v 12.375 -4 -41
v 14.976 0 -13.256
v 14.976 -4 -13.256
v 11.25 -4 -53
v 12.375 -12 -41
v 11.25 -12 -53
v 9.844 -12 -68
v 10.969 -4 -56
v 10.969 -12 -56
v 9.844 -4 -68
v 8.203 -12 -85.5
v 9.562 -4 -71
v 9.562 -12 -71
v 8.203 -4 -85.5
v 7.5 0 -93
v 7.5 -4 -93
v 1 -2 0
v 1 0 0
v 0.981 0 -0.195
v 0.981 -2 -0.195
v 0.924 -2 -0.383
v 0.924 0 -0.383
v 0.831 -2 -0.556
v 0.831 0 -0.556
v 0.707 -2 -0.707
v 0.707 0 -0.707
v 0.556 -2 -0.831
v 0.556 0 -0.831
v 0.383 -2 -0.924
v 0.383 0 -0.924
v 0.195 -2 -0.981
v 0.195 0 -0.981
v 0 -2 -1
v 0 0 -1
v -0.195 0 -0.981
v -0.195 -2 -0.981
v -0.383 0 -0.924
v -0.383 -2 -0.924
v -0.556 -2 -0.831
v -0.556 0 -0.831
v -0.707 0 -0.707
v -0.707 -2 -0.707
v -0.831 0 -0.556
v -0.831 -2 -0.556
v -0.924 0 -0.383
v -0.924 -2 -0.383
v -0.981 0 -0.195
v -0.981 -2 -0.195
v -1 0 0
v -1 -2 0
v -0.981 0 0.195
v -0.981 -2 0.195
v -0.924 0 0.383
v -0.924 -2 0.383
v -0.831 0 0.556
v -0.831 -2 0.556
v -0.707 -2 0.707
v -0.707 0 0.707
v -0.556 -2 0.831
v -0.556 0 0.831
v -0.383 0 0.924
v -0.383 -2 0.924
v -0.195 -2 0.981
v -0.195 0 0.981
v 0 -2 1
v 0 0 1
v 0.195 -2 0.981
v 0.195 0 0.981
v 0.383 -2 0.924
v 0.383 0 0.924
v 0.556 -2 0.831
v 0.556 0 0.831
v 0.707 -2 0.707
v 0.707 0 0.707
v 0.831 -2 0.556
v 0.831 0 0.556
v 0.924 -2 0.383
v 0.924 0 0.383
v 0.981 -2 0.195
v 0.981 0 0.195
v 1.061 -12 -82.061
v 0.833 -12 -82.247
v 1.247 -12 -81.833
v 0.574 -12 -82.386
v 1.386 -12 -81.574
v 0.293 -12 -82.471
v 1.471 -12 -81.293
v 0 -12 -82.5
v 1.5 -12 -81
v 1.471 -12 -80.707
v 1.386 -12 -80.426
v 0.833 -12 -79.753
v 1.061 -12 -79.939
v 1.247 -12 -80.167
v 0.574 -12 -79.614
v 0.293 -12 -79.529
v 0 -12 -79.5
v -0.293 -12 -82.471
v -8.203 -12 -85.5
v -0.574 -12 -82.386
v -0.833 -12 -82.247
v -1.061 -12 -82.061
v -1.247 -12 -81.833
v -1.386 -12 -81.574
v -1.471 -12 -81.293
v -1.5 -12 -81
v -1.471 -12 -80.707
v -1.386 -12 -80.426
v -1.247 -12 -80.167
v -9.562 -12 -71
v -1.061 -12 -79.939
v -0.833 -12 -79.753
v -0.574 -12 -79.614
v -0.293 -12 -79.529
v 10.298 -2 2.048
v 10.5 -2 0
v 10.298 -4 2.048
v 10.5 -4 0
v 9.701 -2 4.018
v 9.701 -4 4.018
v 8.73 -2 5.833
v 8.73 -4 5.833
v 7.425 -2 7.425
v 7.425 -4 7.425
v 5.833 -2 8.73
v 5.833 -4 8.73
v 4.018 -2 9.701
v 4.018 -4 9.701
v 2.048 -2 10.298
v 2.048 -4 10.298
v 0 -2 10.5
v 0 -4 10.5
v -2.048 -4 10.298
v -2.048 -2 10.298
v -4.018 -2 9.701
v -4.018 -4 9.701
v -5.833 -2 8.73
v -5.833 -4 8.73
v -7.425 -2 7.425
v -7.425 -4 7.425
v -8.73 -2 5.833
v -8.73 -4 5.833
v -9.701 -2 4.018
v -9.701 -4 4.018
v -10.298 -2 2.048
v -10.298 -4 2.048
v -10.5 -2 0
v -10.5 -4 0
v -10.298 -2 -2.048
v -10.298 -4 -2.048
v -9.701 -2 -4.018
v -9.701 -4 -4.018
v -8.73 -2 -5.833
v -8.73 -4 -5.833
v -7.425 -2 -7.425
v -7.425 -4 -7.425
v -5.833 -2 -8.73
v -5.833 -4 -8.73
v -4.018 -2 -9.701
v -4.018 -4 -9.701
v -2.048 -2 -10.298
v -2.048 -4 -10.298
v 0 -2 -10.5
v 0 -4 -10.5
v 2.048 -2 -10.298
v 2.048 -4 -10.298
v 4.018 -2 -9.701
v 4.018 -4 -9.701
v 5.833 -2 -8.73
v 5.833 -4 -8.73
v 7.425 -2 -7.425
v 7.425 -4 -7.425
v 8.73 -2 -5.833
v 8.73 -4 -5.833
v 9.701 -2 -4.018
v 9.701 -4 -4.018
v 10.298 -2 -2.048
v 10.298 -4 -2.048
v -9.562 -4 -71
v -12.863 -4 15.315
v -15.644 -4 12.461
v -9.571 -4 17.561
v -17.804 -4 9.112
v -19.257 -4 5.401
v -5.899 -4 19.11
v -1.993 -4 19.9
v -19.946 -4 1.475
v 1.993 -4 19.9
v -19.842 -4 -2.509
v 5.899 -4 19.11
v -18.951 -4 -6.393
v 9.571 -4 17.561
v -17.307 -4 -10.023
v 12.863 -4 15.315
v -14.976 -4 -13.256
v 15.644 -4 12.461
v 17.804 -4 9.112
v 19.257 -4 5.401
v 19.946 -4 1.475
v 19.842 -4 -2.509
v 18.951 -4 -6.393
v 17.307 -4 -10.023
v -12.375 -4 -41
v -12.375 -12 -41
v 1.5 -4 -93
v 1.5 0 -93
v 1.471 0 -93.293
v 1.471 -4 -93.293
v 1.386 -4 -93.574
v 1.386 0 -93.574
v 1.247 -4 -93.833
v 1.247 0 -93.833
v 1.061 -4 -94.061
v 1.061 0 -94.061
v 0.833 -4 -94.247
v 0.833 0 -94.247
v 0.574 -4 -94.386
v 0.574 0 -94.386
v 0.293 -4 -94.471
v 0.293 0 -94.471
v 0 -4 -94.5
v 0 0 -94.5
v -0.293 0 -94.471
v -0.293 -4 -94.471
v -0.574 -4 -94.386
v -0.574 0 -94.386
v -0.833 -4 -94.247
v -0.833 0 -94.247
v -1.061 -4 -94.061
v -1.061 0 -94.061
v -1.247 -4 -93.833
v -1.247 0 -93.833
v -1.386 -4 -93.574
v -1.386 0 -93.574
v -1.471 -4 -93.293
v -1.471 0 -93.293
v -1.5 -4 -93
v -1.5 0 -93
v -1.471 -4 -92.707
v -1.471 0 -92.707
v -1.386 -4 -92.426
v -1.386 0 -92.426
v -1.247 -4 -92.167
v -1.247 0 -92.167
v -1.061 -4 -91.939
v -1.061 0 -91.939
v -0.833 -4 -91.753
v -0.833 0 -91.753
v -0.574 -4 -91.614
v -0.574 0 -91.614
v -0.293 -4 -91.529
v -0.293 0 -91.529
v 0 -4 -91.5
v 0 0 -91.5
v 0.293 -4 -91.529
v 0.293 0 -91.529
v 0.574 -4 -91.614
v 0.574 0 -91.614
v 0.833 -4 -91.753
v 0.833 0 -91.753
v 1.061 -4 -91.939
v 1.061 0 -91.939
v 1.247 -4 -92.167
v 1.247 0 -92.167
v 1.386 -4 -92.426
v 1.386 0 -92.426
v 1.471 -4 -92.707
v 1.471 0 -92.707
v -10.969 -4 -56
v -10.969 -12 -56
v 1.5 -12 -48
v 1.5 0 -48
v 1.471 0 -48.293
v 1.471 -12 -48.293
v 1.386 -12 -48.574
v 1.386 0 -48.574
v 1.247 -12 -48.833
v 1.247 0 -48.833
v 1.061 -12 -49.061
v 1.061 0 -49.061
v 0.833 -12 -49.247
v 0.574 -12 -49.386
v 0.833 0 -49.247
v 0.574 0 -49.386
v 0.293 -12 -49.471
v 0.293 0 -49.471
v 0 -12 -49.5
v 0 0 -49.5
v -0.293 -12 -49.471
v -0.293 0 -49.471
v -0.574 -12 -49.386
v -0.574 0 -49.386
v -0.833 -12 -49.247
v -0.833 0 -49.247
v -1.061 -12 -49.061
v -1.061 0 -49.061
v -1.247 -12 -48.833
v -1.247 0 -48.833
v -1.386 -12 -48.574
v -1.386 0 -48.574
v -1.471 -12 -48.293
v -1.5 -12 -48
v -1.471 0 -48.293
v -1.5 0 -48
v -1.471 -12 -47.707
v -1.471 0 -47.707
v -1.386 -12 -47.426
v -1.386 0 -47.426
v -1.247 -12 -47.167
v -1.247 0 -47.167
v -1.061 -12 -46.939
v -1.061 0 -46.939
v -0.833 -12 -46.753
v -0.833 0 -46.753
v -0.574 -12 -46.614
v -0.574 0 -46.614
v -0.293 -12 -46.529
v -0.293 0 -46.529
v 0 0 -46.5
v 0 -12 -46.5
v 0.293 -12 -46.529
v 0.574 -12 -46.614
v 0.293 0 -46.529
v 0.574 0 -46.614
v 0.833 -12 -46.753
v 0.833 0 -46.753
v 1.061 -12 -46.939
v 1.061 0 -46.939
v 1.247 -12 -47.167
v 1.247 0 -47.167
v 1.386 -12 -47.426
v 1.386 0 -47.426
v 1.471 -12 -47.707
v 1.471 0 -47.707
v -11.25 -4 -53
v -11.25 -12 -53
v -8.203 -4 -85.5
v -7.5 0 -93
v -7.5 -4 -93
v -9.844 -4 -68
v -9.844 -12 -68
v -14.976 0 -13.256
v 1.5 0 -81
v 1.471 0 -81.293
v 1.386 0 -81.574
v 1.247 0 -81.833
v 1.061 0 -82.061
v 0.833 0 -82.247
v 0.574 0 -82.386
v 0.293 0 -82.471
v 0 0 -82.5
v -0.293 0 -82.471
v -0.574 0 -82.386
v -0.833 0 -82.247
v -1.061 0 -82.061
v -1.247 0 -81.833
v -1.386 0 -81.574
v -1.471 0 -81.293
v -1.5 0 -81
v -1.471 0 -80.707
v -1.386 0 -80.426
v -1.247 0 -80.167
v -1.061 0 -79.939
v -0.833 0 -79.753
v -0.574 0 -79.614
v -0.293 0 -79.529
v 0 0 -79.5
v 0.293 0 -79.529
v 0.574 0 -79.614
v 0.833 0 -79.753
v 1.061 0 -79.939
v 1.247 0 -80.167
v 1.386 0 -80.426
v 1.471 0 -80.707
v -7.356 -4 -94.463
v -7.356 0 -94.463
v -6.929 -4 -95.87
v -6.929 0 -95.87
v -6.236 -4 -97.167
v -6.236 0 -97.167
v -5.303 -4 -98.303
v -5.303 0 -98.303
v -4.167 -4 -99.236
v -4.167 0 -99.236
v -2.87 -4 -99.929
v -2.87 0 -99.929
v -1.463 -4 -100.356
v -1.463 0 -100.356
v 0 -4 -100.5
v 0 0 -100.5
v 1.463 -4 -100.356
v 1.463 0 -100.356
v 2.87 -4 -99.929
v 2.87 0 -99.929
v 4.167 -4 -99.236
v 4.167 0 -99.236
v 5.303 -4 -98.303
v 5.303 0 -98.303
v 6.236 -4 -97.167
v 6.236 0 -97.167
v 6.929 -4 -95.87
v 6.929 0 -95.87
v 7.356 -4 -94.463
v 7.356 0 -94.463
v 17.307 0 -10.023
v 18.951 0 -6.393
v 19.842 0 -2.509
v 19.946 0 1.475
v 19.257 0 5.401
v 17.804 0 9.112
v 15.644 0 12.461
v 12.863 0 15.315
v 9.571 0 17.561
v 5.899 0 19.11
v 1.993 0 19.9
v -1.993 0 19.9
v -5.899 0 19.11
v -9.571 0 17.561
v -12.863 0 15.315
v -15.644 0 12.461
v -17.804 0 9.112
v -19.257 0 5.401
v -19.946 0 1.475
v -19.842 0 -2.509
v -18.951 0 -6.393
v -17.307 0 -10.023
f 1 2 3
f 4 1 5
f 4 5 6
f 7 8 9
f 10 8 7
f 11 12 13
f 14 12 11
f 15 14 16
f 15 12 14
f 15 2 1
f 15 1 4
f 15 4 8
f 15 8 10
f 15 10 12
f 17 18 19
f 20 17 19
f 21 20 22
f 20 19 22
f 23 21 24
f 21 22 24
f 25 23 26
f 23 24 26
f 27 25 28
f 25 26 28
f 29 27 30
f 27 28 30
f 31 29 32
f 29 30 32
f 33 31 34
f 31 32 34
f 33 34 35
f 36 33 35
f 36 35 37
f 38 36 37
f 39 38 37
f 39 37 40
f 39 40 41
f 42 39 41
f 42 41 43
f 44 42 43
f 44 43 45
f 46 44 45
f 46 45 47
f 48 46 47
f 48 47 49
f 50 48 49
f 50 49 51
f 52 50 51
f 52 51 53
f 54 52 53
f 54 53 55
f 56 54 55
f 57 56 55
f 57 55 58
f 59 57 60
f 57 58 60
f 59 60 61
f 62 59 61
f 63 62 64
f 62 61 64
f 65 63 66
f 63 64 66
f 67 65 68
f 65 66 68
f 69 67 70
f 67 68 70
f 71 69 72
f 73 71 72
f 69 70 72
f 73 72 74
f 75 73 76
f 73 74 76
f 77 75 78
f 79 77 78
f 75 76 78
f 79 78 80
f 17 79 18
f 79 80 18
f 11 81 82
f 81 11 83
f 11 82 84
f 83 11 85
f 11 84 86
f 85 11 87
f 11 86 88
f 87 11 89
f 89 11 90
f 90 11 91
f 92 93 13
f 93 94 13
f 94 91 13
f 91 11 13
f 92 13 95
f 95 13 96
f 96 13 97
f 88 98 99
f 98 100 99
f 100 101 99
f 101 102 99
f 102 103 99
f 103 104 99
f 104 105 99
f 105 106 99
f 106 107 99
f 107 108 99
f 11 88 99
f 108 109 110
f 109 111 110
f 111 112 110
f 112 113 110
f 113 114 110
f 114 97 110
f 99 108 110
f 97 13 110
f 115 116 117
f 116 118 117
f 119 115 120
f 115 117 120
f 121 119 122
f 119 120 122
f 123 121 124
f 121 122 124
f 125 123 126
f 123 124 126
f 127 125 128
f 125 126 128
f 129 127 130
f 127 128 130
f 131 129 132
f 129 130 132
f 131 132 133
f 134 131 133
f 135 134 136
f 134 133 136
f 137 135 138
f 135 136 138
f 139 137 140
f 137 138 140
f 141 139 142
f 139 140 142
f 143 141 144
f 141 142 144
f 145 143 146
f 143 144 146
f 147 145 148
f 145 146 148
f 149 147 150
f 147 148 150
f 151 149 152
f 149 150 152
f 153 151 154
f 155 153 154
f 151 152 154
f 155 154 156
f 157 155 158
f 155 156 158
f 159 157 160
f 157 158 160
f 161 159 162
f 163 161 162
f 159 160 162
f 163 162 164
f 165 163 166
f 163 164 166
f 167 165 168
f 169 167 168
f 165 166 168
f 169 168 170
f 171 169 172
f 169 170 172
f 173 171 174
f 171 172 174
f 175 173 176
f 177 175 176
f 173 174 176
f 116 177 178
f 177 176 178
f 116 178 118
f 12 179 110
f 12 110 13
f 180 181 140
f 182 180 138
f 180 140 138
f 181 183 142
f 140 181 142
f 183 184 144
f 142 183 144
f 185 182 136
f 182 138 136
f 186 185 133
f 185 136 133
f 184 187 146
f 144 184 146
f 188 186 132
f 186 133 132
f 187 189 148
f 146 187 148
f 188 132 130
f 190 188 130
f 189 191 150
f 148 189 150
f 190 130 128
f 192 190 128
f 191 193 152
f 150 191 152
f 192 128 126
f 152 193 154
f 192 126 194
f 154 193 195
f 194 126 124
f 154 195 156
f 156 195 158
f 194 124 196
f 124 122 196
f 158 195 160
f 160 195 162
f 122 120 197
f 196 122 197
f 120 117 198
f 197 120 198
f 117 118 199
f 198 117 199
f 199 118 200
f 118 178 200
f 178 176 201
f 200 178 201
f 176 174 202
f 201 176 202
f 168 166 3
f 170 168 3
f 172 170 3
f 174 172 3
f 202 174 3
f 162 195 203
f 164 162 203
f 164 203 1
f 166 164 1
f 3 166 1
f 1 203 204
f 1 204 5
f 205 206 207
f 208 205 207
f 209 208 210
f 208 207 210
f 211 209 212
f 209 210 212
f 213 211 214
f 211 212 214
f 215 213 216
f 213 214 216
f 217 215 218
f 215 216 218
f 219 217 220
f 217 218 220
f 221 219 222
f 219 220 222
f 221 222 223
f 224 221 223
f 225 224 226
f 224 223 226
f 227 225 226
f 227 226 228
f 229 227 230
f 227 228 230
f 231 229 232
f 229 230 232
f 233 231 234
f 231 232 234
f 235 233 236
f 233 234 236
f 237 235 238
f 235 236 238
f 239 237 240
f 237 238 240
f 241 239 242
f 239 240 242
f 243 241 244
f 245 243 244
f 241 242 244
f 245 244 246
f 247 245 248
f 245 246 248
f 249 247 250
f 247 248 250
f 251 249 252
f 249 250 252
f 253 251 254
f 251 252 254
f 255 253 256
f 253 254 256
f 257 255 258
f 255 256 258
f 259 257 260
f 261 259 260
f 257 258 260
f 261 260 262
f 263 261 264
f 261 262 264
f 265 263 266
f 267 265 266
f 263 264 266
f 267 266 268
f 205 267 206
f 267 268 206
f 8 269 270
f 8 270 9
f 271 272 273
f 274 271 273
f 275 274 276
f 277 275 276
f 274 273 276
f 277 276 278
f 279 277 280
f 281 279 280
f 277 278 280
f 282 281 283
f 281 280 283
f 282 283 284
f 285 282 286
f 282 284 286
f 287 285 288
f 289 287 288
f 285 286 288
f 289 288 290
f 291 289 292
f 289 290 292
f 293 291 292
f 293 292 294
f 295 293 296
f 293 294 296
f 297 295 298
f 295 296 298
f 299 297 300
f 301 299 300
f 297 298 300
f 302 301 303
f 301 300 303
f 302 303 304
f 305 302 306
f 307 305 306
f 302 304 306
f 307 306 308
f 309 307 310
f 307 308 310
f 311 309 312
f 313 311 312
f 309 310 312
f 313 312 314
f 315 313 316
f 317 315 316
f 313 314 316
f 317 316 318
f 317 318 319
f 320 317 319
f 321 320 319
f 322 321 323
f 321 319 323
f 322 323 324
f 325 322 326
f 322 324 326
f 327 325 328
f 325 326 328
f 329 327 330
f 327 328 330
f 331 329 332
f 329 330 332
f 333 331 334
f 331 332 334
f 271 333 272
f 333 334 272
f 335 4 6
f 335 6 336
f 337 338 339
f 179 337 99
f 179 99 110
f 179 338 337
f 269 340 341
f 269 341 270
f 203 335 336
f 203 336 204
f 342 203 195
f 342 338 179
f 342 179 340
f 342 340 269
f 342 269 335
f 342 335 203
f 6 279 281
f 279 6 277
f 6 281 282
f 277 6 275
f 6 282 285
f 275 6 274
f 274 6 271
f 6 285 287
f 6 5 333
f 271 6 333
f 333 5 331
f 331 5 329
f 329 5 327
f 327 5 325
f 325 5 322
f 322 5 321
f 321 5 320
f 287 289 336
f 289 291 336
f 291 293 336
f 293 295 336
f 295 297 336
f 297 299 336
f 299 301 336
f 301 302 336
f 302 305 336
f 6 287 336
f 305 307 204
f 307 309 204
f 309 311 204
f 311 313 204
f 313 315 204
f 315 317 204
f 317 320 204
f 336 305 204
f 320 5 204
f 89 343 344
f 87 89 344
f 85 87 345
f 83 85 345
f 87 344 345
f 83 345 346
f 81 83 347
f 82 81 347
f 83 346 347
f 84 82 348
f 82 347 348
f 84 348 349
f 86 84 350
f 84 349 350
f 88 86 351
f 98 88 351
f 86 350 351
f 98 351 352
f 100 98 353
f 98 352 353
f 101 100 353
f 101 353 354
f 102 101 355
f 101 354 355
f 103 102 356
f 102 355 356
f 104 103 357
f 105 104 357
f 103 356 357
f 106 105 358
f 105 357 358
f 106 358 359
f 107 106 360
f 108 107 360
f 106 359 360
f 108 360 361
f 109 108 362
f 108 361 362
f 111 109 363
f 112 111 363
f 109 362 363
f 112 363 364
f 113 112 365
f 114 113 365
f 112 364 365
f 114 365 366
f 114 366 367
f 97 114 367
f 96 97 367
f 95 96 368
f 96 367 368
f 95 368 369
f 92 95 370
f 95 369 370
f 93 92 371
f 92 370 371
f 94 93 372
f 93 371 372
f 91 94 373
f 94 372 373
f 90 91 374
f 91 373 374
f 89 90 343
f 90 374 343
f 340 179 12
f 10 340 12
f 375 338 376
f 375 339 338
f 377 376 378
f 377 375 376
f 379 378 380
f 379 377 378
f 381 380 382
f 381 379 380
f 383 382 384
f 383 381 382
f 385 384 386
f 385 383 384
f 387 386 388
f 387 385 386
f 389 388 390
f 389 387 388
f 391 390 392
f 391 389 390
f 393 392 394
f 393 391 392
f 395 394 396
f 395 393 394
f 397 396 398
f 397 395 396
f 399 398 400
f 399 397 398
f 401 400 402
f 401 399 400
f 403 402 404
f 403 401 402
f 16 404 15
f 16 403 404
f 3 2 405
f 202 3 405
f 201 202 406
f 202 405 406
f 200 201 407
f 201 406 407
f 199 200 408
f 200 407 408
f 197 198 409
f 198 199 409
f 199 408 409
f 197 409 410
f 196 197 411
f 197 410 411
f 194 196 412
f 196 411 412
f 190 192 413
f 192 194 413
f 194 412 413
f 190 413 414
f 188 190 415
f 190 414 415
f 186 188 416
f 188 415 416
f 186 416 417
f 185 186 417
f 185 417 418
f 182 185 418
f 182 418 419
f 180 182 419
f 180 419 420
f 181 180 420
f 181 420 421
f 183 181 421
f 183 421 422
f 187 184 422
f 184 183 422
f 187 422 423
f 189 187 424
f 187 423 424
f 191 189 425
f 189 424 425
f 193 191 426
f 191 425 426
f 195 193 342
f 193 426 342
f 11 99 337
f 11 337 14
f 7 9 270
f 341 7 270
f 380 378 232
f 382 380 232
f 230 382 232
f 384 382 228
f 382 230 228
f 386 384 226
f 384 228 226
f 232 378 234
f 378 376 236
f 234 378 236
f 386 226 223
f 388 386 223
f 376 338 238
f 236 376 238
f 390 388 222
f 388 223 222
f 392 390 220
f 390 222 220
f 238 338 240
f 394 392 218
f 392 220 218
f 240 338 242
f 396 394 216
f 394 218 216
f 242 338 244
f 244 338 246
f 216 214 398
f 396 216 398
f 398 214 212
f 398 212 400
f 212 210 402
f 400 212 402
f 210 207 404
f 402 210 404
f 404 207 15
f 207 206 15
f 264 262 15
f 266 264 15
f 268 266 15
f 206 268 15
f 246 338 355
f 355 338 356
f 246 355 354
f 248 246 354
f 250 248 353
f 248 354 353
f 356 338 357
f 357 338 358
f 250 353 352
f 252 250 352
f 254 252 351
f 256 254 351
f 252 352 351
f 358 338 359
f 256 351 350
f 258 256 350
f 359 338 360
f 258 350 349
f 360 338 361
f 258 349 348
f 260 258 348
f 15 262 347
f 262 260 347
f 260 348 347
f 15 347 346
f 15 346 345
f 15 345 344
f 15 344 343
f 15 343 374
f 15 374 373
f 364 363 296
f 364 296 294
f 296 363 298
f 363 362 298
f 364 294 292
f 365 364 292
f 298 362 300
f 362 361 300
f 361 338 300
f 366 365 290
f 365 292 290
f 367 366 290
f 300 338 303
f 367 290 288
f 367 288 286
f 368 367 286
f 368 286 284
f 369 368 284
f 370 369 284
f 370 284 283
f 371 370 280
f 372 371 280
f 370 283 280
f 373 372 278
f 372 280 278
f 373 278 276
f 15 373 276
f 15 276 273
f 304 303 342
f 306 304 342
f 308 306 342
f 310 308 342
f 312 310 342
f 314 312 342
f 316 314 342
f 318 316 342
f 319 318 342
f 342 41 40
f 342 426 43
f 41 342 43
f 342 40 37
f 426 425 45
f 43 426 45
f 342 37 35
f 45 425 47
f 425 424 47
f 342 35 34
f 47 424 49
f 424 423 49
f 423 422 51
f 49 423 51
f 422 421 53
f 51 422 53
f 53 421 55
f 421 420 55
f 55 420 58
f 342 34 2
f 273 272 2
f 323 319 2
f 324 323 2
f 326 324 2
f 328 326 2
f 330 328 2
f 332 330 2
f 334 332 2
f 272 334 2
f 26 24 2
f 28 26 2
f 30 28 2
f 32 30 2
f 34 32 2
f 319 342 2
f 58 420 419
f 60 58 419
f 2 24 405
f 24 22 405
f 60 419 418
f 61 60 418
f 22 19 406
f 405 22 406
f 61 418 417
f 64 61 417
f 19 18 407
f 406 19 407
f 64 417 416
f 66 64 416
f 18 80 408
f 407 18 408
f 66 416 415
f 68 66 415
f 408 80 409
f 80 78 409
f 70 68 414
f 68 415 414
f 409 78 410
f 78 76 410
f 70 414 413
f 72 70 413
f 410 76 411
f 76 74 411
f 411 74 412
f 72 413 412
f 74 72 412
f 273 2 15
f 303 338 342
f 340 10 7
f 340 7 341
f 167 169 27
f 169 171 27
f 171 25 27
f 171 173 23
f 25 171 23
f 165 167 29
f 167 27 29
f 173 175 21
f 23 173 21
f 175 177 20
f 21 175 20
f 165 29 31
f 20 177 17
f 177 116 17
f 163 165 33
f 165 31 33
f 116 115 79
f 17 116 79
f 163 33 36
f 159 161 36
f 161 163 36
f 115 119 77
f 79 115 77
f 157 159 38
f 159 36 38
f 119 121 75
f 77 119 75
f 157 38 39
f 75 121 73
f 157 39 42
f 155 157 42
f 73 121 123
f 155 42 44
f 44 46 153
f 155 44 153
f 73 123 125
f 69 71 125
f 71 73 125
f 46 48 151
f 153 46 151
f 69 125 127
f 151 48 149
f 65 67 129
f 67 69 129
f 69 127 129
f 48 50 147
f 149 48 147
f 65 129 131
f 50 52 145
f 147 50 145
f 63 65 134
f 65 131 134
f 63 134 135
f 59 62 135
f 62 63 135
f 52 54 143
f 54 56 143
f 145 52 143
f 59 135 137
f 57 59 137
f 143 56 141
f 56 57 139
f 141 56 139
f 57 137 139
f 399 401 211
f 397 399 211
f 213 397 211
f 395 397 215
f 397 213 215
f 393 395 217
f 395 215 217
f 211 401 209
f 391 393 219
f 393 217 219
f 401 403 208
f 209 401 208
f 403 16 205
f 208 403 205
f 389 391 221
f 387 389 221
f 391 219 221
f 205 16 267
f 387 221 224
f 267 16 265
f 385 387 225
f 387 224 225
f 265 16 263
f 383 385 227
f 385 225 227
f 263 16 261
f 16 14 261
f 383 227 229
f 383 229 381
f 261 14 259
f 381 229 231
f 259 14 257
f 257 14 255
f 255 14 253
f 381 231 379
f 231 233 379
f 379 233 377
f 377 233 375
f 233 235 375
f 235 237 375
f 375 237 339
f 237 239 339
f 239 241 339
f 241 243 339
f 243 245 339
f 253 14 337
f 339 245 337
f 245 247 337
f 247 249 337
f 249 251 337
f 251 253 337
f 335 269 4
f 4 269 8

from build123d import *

# Parameters (mm, degrees)
SKETCH2_R           = 1
CUT_EXTRUDE1_DEPTH  = 10
BOSS_EXTRUDE1_DEPTH = 4
BOSS_EXTRUDE2_DEPTH = 8
SKETCH5_R           = 1.5
CUT_EXTRUDE2_DEPTH  = 12
SKETCH6_R           = 7.5
BOSS_EXTRUDE3_DEPTH = 12
CUT_EXTRUDE3_DEPTH  = 8
SKETCH8_R           = 1.5
CUT_EXTRUDE4_DEPTH  = 4


with BuildPart() as part:
    # Sketch1 → Revolve1 (revolve)
    with BuildSketch(Plane.XY):
        Polygon((0, -2), (10.5, -2), (10.5, -4), (20, -4), (20, 0), (0, 0), align=None)
    revolve(axis=Axis((0, 0, 0), (0, -1, 0)))

    # Sketch2 → Cut-Extrude1 (cut)
    with BuildSketch(Plane(origin=(0, 0, 0), x_dir=(1, 0, 0), z_dir=(0, 1, 0))):
        Circle(SKETCH2_R)
    extrude(amount=-CUT_EXTRUDE1_DEPTH, mode=Mode.SUBTRACT)

    # Sketch3 → Boss-Extrude1 (add)
    with BuildSketch(Plane(origin=(0, 0, 0), x_dir=(1, 0, 0), z_dir=(0, 1, 0))):
        Polygon((-7.5, 93), (-15, 13), (15, 13), (7.5, 93), align=None)
    extrude(amount=-BOSS_EXTRUDE1_DEPTH)

    # Sketch4 → Boss-Extrude2 (add)
    with BuildSketch(Plane.XZ.offset(4)):
        Polygon((-12.375, -41), (12.375, -41), (11.25, -53), (-11.25, -53), align=None)
        Polygon((-10.96875, -56), (10.96875, -56), (9.84375, -68), (-9.84375, -68), align=None)
        Polygon((-9.5625, -71), (9.5625, -71), (7.5, -93), (-7.5, -93), align=None)
    extrude(amount=BOSS_EXTRUDE2_DEPTH)

    # Sketch5 → Cut-Extrude2 (cut)
    with BuildSketch(Plane(origin=(0, 0, 0), x_dir=(1, 0, 0), z_dir=(0, 1, 0))):
        with Locations((0, 48)):
            Circle(SKETCH5_R)
        with Locations((0, 81)):
            Circle(SKETCH5_R)
    extrude(amount=-CUT_EXTRUDE2_DEPTH, mode=Mode.SUBTRACT)

    # Sketch6 → Boss-Extrude3 (add)
    with BuildSketch(Plane.XZ.offset(12)):
        with Locations((0, -93)):
            Circle(SKETCH6_R)
    extrude(amount=-BOSS_EXTRUDE3_DEPTH)

    # Sketch7 → Cut-Extrude3 (cut)
    with BuildSketch(Plane.XZ.offset(12)):
        with BuildLine():
            Line((-8.203125, -85.5), (8.203125, -85.5))
            Line((8.203125, -85.5), (7.5, -93))
            ThreePointArc((7.5, -93), (0, -100.5), (-7.5, -93))
            Line((-7.5, -93), (-8.203125, -85.5))
        make_face()
    extrude(amount=-CUT_EXTRUDE3_DEPTH, mode=Mode.SUBTRACT)

    # Sketch8 → Cut-Extrude4 (cut)
    with BuildSketch(Plane(origin=(0, 0, 0), x_dir=(1, 0, 0), z_dir=(0, 1, 0))):
        with Locations((0, 93)):
            Circle(SKETCH8_R)
    extrude(amount=-CUT_EXTRUDE4_DEPTH, mode=Mode.SUBTRACT)


solid = part.part
